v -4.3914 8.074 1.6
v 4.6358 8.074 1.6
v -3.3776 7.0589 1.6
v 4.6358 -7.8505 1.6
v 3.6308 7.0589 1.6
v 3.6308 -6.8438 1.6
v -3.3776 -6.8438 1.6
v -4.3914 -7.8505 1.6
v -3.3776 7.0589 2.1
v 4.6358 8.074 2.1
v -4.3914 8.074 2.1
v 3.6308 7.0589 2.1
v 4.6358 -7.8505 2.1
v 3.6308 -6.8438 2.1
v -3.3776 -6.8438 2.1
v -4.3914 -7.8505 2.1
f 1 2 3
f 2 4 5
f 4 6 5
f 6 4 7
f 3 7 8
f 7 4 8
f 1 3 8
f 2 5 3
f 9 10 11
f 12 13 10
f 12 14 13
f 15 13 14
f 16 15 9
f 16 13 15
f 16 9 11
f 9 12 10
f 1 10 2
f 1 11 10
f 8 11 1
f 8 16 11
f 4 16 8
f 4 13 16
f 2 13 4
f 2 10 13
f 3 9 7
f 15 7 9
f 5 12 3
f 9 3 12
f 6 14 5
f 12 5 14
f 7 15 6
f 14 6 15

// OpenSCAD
/********
Pokemon Damage Tokens (2-part for MMU).

Requires the Symbola font to be installed for emoji rendering.

1. Uncomment your desired token type.
2. To render parts separately comment the call to either RenderBody() or RenderText().
********/

// poison
token_diameter = 22;
token_color = "green";
text_content = "💀";
text_size = 13;
text_font = "Symbola:style=Bold";

// burn
/*
token_diameter = 22;
token_color = "red";
text_content = "🔥";
text_size = 11;
text_font = "Symbola:style=Bold";
*/

// damage 10
/*
token_diameter = 15;
token_color = "yellow";
text_content = "10";
text_size = 8;
text_font = "Arial:style=Bold";
*/

// damage 50
/*
token_diameter = 15;
token_color = "orange";
text_content = "50";
text_size = 8;
text_font = "Arial:style=Bold";
*/

// damage 100
/*
token_diameter = 15;
token_color = "red";
text_content = "100";
text_size = 6;
text_font = "Arial:style=Bold";
*/

// global
text_height = 0.5;
text_emboss = 0.1;
text_color = "white";
token_height = 2;
token_resolution = 180;


module TokenBody(){
    color(token_color){
        cylinder(h=token_height, d=token_diameter, $fn=token_resolution);
    }
}

module TokenText(){
    translate([0,0,(token_height-text_height+text_emboss)]) {
        color(text_color){
            linear_extrude(height=text_height) {
                text(text=text_content, size=text_size, font=text_font, halign="center", valign="center");
            }
        }
    }
}

module RenderBody(){
    difference(){
        TokenBody();
        TokenText();
    }
}

module RenderText(){
    TokenText();
}

//RenderBody();
RenderText();
